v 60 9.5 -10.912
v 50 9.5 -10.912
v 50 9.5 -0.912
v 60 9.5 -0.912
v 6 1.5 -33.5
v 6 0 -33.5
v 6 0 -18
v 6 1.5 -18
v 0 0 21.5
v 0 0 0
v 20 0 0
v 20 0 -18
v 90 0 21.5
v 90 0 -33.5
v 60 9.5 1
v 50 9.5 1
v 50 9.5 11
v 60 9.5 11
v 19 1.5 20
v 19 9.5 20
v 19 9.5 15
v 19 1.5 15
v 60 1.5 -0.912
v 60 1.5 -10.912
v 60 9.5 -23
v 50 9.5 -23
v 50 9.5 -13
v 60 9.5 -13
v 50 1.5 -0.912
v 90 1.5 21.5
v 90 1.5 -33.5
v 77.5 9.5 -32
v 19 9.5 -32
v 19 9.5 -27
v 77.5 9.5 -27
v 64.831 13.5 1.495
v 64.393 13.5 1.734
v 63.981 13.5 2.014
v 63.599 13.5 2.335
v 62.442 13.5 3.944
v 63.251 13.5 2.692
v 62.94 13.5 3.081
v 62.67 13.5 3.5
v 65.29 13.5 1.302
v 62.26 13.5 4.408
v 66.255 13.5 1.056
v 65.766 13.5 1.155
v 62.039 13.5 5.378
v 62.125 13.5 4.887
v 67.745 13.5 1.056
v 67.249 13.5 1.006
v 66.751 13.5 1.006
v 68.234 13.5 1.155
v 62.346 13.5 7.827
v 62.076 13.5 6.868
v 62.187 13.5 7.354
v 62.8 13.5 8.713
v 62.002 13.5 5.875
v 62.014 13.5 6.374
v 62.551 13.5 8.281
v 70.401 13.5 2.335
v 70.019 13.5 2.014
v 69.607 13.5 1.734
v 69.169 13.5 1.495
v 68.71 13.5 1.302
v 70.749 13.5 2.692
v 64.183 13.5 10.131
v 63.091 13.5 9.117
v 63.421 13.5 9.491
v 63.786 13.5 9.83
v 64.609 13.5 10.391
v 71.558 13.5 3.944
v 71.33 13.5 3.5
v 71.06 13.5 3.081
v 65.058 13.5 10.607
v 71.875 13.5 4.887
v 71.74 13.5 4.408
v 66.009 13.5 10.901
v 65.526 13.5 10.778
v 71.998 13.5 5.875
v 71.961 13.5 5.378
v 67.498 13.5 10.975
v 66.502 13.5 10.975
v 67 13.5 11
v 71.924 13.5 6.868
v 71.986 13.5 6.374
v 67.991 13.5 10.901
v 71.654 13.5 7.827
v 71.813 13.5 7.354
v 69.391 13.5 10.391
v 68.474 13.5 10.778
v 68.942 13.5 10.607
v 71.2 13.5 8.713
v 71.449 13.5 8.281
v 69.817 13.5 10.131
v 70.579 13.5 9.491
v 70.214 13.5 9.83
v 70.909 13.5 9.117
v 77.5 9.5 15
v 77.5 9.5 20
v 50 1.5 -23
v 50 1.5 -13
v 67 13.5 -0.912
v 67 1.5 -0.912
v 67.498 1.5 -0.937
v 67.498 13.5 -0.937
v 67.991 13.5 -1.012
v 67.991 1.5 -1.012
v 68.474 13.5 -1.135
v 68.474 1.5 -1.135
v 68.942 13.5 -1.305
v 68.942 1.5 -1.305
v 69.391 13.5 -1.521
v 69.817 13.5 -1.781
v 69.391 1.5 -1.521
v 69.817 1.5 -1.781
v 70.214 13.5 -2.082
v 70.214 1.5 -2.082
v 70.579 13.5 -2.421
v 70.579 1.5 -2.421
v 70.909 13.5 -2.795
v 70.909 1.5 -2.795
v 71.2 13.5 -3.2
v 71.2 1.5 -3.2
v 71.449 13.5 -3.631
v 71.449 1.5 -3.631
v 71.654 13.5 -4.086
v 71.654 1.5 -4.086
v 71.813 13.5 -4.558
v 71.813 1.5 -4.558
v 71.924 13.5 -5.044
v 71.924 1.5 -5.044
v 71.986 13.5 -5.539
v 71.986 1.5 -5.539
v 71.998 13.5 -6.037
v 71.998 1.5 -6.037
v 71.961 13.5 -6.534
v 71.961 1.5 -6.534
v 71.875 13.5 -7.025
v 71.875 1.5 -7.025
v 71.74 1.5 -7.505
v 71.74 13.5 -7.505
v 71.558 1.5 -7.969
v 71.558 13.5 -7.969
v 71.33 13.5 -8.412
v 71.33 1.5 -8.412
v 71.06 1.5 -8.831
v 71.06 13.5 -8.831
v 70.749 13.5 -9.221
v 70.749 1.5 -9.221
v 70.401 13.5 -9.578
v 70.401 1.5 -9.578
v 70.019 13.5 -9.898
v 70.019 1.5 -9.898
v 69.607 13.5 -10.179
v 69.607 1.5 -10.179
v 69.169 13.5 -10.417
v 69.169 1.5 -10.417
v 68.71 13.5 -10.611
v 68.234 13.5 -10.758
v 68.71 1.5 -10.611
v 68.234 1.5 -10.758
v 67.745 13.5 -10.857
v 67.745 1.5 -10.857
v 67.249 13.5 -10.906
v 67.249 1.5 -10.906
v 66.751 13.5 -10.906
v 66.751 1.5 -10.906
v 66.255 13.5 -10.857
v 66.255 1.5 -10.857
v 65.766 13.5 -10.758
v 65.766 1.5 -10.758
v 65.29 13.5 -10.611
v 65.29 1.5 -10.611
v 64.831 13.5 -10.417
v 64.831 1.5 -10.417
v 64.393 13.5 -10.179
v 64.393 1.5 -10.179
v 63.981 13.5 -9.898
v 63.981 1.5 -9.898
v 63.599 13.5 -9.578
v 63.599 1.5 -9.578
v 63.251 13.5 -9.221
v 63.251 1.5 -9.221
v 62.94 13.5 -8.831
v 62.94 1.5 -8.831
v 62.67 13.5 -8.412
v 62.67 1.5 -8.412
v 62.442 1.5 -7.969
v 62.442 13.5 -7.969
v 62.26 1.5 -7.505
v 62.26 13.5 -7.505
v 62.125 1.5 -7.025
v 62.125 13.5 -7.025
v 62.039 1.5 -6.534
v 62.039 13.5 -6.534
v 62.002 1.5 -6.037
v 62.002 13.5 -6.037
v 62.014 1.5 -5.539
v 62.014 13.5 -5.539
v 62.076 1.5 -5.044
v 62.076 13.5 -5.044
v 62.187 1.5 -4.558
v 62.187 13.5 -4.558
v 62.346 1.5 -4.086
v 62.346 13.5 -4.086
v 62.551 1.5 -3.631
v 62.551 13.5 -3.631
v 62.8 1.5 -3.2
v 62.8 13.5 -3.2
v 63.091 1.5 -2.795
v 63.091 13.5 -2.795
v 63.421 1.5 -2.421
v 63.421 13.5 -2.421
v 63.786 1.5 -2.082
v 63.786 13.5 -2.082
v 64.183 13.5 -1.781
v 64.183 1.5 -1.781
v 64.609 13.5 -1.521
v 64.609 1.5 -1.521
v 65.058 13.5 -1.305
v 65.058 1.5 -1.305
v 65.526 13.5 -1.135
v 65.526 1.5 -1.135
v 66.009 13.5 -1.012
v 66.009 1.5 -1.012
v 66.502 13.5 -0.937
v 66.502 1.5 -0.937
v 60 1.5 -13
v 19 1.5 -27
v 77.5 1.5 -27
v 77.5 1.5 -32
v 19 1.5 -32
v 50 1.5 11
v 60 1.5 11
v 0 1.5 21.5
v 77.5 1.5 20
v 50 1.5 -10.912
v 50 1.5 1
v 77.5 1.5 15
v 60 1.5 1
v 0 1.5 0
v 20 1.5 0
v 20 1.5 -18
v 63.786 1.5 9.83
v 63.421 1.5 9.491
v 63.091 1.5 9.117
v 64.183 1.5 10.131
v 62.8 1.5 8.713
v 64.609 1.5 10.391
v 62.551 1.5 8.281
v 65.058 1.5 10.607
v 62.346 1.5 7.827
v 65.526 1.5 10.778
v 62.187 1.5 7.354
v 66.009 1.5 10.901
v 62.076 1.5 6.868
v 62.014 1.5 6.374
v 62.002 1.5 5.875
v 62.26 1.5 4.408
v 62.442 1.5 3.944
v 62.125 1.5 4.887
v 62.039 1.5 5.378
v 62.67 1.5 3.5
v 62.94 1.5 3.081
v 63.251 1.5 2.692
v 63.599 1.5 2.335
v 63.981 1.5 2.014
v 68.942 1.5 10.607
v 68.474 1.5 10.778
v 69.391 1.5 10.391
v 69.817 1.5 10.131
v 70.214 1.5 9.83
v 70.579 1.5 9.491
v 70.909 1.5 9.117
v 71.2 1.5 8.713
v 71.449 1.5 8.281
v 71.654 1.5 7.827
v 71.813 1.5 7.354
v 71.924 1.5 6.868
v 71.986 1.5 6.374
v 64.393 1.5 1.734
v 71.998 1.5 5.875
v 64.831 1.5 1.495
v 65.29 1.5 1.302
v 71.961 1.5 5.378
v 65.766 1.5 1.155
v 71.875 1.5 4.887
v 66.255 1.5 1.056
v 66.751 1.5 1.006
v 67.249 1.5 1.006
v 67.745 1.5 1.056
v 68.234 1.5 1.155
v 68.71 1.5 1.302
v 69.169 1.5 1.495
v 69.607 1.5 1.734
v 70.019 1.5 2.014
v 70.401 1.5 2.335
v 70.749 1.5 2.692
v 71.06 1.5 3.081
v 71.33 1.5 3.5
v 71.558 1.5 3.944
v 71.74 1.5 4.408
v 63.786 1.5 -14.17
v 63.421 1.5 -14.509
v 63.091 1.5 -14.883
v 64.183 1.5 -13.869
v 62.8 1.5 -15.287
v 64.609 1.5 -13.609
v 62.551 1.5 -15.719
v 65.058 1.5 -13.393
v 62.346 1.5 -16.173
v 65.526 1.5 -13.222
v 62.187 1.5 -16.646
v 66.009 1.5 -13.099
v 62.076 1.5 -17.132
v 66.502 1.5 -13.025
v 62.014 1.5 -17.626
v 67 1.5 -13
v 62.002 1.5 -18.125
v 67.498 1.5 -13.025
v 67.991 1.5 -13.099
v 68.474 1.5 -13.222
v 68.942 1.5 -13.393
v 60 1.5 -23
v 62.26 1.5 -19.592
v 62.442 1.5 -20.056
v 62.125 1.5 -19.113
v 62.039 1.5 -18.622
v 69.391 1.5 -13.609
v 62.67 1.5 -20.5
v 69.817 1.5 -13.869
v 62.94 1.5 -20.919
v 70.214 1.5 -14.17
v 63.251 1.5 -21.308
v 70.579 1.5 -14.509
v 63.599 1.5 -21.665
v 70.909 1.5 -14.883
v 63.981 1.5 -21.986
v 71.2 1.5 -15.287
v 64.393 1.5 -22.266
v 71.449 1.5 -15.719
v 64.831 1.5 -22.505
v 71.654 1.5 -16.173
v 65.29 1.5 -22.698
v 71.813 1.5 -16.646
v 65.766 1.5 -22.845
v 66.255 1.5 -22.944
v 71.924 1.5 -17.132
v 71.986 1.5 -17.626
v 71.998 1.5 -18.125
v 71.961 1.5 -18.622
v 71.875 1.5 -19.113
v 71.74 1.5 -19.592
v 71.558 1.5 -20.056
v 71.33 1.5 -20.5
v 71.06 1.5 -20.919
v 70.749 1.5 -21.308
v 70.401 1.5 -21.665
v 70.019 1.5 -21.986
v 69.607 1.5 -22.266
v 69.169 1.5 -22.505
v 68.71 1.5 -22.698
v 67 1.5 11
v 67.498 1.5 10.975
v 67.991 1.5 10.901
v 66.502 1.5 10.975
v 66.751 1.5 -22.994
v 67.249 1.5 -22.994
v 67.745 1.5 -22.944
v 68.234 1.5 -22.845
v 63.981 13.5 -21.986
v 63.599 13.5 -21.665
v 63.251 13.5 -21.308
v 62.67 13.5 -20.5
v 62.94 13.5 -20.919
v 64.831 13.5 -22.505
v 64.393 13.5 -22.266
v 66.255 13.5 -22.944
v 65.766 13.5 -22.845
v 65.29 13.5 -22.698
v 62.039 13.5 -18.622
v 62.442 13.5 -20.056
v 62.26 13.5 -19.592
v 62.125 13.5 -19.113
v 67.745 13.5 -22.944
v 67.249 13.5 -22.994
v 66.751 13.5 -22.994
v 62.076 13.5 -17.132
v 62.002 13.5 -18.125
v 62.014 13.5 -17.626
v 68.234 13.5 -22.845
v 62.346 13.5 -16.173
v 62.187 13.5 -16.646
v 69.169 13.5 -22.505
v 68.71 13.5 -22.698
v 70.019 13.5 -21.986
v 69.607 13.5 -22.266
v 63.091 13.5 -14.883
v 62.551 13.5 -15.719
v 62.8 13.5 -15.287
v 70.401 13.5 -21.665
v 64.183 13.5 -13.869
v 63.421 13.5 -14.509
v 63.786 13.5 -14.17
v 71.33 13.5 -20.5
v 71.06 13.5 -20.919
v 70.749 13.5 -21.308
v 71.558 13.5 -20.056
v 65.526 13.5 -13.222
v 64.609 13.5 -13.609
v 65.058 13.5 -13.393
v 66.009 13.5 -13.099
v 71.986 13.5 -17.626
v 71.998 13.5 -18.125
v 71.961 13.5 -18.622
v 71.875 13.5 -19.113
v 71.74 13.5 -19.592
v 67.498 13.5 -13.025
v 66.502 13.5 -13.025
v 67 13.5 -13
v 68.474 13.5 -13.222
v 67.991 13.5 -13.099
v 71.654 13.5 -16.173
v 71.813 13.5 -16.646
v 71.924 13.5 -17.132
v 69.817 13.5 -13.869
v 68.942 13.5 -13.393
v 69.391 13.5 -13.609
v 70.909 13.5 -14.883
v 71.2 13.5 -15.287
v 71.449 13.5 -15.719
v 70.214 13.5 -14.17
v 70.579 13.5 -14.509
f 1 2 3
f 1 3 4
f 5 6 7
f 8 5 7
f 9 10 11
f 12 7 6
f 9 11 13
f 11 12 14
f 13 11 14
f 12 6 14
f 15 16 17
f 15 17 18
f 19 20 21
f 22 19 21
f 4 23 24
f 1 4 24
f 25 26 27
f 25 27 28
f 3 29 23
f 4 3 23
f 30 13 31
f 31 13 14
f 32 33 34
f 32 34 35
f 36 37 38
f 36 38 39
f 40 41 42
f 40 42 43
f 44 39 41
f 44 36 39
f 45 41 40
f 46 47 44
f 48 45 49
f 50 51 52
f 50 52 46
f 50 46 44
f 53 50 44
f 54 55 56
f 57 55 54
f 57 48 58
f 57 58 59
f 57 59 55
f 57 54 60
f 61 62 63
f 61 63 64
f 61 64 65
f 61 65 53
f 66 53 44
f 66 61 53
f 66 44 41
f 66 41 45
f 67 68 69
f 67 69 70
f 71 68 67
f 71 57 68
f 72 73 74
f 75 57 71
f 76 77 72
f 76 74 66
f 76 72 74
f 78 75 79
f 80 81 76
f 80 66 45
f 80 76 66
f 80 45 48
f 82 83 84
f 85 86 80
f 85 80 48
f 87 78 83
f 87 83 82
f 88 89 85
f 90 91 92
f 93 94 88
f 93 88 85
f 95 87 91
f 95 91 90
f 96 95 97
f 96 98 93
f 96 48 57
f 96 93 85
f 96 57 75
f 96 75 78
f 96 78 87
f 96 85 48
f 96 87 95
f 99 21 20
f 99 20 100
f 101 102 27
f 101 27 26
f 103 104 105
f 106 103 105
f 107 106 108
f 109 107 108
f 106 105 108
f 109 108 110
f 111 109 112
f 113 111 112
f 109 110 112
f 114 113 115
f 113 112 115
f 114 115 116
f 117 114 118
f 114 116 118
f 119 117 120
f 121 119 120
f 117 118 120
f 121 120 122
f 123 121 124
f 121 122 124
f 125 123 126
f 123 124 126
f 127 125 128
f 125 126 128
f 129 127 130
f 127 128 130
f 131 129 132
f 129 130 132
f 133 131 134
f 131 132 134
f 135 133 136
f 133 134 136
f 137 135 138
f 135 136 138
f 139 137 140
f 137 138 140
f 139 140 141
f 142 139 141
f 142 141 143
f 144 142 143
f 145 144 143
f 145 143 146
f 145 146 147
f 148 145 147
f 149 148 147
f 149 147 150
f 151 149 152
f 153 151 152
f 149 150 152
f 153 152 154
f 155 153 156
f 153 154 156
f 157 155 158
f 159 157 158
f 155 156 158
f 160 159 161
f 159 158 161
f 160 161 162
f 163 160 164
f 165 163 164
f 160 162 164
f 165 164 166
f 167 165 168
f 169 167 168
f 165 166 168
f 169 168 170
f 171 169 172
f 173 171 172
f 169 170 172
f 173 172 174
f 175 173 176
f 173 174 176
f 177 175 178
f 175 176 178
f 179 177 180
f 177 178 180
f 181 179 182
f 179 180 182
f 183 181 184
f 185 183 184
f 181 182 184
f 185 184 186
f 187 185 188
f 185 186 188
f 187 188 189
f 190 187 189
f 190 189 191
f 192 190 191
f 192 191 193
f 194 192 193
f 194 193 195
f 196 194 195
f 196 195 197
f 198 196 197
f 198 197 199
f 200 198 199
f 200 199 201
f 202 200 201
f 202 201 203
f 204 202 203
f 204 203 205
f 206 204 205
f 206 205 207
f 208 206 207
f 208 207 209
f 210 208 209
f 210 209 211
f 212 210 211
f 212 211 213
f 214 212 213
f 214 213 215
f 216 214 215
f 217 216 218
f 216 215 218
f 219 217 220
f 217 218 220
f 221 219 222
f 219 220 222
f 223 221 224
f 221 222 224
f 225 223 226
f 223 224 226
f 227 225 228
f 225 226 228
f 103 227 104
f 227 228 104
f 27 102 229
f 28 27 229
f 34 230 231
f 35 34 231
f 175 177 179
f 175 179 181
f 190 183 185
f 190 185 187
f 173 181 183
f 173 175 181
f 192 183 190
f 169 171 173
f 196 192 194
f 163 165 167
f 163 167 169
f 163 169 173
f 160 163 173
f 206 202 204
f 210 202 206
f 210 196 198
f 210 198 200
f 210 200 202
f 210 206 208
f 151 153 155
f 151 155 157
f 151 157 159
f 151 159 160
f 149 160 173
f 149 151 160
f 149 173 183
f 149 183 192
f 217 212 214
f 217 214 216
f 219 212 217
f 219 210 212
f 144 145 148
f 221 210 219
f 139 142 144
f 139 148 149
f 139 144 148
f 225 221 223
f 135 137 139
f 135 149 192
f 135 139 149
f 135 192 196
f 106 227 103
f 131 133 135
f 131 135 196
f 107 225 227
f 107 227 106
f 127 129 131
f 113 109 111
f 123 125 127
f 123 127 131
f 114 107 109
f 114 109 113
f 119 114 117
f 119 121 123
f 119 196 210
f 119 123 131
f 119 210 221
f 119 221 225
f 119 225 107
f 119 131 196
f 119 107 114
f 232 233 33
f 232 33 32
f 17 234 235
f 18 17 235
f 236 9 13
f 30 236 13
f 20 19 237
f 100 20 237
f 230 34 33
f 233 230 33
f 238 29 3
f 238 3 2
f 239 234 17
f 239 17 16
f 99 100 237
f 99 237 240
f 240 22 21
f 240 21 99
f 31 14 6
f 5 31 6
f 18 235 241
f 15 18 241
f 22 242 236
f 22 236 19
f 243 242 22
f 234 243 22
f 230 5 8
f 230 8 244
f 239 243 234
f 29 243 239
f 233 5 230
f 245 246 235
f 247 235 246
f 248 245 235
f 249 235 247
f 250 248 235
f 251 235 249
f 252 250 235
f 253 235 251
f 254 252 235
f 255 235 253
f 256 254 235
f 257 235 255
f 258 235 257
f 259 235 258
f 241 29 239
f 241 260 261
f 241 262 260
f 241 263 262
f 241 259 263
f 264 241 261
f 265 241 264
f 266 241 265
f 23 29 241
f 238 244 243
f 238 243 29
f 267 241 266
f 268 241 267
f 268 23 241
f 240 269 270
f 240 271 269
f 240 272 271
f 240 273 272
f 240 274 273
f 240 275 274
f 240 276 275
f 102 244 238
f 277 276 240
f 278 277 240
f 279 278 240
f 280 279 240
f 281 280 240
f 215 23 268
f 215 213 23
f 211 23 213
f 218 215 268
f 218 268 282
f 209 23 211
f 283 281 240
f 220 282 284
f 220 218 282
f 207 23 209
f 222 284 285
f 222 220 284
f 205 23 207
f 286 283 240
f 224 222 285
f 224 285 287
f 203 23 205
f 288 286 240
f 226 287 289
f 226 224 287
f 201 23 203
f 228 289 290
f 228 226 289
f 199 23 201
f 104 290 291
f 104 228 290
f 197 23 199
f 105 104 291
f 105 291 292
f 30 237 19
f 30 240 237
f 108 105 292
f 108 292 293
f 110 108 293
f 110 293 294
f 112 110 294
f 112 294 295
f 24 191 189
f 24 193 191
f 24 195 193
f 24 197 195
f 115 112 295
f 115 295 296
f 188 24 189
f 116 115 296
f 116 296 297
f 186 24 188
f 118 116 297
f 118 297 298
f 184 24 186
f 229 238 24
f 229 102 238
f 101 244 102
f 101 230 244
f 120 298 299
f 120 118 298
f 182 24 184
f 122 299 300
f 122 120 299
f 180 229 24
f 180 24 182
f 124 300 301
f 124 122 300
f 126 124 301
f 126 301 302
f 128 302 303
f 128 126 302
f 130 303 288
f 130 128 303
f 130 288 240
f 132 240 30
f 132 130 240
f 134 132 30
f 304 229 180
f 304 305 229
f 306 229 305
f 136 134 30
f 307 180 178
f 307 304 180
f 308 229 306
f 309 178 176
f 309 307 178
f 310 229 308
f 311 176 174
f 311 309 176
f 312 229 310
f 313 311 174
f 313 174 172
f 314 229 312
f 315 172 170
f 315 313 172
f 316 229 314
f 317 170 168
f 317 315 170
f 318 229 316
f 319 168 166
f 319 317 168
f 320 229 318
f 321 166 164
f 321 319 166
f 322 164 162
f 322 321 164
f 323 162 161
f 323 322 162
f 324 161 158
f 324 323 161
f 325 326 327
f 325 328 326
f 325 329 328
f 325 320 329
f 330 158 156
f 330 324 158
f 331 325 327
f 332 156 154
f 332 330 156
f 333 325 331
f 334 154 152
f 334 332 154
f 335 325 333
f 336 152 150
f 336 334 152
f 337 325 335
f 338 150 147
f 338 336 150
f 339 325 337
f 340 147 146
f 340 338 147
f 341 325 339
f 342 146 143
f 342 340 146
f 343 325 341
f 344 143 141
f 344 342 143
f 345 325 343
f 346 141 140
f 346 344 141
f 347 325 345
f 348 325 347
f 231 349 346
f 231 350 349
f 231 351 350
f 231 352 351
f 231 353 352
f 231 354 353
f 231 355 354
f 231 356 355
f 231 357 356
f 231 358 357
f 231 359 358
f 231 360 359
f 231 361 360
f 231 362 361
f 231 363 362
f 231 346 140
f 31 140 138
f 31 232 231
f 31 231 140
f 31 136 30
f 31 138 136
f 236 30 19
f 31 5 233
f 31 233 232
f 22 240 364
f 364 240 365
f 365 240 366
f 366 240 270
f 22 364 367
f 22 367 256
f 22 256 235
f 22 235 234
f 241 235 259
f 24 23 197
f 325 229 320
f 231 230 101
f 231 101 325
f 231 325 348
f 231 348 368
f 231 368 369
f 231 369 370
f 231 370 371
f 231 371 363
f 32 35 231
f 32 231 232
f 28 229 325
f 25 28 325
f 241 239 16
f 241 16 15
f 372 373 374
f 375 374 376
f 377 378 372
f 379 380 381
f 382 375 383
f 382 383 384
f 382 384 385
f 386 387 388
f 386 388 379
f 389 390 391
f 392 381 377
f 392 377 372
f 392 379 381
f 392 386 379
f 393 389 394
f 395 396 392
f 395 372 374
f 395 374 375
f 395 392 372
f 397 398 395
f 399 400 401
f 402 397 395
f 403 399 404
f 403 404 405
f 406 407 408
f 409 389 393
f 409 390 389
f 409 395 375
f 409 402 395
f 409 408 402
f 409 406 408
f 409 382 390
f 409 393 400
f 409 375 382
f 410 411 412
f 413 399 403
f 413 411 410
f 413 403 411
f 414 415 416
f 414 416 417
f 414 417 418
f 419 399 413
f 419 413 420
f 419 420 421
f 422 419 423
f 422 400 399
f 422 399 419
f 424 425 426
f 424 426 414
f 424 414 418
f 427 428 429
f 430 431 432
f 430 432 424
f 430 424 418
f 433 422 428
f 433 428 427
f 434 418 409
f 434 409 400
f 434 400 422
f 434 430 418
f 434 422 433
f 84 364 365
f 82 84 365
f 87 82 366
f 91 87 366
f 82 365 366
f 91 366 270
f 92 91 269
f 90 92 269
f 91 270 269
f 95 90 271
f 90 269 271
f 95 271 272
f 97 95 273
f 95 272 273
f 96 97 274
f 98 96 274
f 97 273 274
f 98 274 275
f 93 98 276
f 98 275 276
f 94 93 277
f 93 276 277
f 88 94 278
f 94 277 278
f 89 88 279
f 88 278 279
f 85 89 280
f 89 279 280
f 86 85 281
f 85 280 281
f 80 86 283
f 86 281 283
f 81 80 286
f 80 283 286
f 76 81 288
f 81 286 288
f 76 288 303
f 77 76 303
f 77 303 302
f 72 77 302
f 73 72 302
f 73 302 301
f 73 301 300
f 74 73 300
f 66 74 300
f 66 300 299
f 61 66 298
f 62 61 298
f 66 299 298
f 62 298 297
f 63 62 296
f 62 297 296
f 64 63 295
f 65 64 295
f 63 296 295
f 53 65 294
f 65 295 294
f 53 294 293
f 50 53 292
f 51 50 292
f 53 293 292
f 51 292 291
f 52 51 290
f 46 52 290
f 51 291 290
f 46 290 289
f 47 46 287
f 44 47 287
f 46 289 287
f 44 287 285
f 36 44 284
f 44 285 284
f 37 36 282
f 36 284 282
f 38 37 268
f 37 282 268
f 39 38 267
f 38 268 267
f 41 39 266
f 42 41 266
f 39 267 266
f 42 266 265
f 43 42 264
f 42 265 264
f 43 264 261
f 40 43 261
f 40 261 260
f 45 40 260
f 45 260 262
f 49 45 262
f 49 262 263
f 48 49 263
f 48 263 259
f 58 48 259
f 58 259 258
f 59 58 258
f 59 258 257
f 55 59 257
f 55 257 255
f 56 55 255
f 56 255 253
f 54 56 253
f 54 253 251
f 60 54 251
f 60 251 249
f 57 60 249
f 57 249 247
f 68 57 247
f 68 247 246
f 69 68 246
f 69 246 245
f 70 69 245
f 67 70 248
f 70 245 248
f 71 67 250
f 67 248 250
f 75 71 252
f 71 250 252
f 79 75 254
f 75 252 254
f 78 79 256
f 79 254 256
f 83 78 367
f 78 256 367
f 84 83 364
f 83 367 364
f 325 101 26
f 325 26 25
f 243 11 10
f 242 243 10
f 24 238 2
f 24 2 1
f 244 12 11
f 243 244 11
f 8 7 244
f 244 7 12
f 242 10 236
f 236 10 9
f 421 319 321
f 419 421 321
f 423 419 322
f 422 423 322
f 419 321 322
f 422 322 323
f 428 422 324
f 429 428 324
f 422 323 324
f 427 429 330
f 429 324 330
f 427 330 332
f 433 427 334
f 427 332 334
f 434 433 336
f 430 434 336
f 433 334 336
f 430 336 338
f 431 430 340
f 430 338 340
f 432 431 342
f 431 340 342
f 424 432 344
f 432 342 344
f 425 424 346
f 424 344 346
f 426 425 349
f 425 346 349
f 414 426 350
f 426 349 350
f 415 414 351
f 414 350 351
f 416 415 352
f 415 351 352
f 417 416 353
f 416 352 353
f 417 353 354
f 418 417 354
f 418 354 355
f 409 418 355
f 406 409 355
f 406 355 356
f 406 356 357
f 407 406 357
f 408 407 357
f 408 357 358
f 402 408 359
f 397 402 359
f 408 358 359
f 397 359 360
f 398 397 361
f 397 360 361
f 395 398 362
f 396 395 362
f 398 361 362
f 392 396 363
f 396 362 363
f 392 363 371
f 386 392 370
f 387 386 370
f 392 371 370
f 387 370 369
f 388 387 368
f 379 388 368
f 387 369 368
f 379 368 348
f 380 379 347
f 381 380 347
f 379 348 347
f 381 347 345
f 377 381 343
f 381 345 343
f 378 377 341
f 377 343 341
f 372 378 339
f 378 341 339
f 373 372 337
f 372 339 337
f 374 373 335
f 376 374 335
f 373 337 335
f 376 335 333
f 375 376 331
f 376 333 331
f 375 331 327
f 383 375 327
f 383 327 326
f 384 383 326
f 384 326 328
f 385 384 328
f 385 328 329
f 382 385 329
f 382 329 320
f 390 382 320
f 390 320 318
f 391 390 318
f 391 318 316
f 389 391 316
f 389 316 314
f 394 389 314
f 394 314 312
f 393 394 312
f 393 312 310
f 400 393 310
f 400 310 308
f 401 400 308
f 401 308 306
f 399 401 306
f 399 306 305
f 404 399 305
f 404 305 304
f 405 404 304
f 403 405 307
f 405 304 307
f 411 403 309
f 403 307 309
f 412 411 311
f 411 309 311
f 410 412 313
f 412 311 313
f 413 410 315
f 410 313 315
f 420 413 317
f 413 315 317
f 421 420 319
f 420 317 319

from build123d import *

# Parameters (mm, degrees)
BOSS_EXTRUDE1_DEPTH = 1.5
SKETCH2_W           = 58.5
SKETCH2_H           = 5
BOSS_EXTRUDE2_DEPTH = 8
SKETCH3_W           = 10
SKETCH3_H           = 10
BOSS_EXTRUDE3_DEPTH = 8
SKETCH4_R           = 5
BOSS_EXTRUDE4_DEPTH = 12


with BuildPart() as part:
    # Sketch1 → Boss-Extrude1 (new body)
    with BuildSketch(Plane(origin=(0, 0, 0), x_dir=(1, 0, 0), z_dir=(0, 1, 0))):
        Polygon((0, 0), (0, -21.5), (90, -21.5), (90, 33.5), (6, 33.5), (6, 18), (20, 18), (20, 0), align=None)
    extrude(amount=BOSS_EXTRUDE1_DEPTH)

    # Sketch2 → Boss-Extrude2 (add)
    with BuildSketch(Plane(origin=(0, 1.5, 0), x_dir=(1, 0, 0), z_dir=(0, 1, 0))):
        with Locations((48.25, -17.5)):
            Rectangle(SKETCH2_W, SKETCH2_H)
        with Locations((48.25, 29.5)):
            Rectangle(SKETCH2_W, SKETCH2_H)
    extrude(amount=BOSS_EXTRUDE2_DEPTH)

    # Sketch3 → Boss-Extrude3 (add)
    with BuildSketch(Plane(origin=(0, 1.5, 0), x_dir=(1, 0, 0), z_dir=(0, 1, 0))):
        with Locations((55, 18)):
            Rectangle(SKETCH3_W, SKETCH3_H)
        with Locations((55, 5.912448656)):
            Rectangle(SKETCH3_W, SKETCH3_H)
        with Locations((55, -6)):
            Rectangle(SKETCH3_W, SKETCH3_H)
    extrude(amount=BOSS_EXTRUDE3_DEPTH)

    # Sketch4 → Boss-Extrude4 (add)
    with BuildSketch(Plane(origin=(0, 1.5, 0), x_dir=(1, 0, 0), z_dir=(0, 1, 0))):
        with Locations(Location((67, 18, 0), (0, 0, 270))):
            Circle(SKETCH4_R)
        with Locations(Location((67, 5.912448656, 0), (0, 0, 270))):
            Circle(SKETCH4_R)
        with Locations(Location((67, -6, 0), (0, 0, 270))):
            Circle(SKETCH4_R)
    extrude(amount=BOSS_EXTRUDE4_DEPTH)


solid = part.part
